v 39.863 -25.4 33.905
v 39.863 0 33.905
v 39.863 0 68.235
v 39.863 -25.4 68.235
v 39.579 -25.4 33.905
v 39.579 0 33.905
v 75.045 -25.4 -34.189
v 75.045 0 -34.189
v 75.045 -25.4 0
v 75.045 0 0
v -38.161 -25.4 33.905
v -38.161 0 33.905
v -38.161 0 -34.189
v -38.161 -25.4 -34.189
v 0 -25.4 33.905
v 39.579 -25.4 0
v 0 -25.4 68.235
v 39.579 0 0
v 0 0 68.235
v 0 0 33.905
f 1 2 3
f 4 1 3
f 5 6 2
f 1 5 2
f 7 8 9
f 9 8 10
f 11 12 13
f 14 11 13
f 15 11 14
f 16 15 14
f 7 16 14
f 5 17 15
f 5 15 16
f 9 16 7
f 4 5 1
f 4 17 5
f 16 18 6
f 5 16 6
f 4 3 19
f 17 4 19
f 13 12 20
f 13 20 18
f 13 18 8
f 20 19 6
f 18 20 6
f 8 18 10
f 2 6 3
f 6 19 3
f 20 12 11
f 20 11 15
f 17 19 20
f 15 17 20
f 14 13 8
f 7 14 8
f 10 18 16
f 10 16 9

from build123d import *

# Parameters (mm, degrees)
F0_W     = 38.1607972085
F0_H     = 33.9049473405
F0_W_2   = 39.5794175565
F0_H_2   = 34.1886691749
F0_W_3   = 35.4654230177
F1_DEPTH = 25.4


with BuildPart() as f1:
    # F0 (on Front) → F1 (new body)
    with BuildSketch(Plane.XZ):
        with Locations((-19.0803986043, 16.9524736702)):
            Rectangle(F0_W, F0_H)
        Polygon((0, 68.2354792953), (0, 33.9049473405), (39.5794175565, 33.9049473405), (39.8631393909, 33.9049473405), (39.8631393909, 68.2354792953), align=None)
        with Locations((19.7897087783, 16.9524736702)):
            Rectangle(F0_W_2, F0_H)
        with Locations((-19.0803986043, -17.0943345875)):
            Rectangle(F0_W, F0_H_2)
        with Locations((19.7897087783, -17.0943345875)):
            Rectangle(F0_W_2, F0_H_2)
        with Locations((57.3121290654, -17.0943345875)):
            Rectangle(F0_W_3, F0_H_2)
    extrude(amount=F1_DEPTH)


solid = f1.part
